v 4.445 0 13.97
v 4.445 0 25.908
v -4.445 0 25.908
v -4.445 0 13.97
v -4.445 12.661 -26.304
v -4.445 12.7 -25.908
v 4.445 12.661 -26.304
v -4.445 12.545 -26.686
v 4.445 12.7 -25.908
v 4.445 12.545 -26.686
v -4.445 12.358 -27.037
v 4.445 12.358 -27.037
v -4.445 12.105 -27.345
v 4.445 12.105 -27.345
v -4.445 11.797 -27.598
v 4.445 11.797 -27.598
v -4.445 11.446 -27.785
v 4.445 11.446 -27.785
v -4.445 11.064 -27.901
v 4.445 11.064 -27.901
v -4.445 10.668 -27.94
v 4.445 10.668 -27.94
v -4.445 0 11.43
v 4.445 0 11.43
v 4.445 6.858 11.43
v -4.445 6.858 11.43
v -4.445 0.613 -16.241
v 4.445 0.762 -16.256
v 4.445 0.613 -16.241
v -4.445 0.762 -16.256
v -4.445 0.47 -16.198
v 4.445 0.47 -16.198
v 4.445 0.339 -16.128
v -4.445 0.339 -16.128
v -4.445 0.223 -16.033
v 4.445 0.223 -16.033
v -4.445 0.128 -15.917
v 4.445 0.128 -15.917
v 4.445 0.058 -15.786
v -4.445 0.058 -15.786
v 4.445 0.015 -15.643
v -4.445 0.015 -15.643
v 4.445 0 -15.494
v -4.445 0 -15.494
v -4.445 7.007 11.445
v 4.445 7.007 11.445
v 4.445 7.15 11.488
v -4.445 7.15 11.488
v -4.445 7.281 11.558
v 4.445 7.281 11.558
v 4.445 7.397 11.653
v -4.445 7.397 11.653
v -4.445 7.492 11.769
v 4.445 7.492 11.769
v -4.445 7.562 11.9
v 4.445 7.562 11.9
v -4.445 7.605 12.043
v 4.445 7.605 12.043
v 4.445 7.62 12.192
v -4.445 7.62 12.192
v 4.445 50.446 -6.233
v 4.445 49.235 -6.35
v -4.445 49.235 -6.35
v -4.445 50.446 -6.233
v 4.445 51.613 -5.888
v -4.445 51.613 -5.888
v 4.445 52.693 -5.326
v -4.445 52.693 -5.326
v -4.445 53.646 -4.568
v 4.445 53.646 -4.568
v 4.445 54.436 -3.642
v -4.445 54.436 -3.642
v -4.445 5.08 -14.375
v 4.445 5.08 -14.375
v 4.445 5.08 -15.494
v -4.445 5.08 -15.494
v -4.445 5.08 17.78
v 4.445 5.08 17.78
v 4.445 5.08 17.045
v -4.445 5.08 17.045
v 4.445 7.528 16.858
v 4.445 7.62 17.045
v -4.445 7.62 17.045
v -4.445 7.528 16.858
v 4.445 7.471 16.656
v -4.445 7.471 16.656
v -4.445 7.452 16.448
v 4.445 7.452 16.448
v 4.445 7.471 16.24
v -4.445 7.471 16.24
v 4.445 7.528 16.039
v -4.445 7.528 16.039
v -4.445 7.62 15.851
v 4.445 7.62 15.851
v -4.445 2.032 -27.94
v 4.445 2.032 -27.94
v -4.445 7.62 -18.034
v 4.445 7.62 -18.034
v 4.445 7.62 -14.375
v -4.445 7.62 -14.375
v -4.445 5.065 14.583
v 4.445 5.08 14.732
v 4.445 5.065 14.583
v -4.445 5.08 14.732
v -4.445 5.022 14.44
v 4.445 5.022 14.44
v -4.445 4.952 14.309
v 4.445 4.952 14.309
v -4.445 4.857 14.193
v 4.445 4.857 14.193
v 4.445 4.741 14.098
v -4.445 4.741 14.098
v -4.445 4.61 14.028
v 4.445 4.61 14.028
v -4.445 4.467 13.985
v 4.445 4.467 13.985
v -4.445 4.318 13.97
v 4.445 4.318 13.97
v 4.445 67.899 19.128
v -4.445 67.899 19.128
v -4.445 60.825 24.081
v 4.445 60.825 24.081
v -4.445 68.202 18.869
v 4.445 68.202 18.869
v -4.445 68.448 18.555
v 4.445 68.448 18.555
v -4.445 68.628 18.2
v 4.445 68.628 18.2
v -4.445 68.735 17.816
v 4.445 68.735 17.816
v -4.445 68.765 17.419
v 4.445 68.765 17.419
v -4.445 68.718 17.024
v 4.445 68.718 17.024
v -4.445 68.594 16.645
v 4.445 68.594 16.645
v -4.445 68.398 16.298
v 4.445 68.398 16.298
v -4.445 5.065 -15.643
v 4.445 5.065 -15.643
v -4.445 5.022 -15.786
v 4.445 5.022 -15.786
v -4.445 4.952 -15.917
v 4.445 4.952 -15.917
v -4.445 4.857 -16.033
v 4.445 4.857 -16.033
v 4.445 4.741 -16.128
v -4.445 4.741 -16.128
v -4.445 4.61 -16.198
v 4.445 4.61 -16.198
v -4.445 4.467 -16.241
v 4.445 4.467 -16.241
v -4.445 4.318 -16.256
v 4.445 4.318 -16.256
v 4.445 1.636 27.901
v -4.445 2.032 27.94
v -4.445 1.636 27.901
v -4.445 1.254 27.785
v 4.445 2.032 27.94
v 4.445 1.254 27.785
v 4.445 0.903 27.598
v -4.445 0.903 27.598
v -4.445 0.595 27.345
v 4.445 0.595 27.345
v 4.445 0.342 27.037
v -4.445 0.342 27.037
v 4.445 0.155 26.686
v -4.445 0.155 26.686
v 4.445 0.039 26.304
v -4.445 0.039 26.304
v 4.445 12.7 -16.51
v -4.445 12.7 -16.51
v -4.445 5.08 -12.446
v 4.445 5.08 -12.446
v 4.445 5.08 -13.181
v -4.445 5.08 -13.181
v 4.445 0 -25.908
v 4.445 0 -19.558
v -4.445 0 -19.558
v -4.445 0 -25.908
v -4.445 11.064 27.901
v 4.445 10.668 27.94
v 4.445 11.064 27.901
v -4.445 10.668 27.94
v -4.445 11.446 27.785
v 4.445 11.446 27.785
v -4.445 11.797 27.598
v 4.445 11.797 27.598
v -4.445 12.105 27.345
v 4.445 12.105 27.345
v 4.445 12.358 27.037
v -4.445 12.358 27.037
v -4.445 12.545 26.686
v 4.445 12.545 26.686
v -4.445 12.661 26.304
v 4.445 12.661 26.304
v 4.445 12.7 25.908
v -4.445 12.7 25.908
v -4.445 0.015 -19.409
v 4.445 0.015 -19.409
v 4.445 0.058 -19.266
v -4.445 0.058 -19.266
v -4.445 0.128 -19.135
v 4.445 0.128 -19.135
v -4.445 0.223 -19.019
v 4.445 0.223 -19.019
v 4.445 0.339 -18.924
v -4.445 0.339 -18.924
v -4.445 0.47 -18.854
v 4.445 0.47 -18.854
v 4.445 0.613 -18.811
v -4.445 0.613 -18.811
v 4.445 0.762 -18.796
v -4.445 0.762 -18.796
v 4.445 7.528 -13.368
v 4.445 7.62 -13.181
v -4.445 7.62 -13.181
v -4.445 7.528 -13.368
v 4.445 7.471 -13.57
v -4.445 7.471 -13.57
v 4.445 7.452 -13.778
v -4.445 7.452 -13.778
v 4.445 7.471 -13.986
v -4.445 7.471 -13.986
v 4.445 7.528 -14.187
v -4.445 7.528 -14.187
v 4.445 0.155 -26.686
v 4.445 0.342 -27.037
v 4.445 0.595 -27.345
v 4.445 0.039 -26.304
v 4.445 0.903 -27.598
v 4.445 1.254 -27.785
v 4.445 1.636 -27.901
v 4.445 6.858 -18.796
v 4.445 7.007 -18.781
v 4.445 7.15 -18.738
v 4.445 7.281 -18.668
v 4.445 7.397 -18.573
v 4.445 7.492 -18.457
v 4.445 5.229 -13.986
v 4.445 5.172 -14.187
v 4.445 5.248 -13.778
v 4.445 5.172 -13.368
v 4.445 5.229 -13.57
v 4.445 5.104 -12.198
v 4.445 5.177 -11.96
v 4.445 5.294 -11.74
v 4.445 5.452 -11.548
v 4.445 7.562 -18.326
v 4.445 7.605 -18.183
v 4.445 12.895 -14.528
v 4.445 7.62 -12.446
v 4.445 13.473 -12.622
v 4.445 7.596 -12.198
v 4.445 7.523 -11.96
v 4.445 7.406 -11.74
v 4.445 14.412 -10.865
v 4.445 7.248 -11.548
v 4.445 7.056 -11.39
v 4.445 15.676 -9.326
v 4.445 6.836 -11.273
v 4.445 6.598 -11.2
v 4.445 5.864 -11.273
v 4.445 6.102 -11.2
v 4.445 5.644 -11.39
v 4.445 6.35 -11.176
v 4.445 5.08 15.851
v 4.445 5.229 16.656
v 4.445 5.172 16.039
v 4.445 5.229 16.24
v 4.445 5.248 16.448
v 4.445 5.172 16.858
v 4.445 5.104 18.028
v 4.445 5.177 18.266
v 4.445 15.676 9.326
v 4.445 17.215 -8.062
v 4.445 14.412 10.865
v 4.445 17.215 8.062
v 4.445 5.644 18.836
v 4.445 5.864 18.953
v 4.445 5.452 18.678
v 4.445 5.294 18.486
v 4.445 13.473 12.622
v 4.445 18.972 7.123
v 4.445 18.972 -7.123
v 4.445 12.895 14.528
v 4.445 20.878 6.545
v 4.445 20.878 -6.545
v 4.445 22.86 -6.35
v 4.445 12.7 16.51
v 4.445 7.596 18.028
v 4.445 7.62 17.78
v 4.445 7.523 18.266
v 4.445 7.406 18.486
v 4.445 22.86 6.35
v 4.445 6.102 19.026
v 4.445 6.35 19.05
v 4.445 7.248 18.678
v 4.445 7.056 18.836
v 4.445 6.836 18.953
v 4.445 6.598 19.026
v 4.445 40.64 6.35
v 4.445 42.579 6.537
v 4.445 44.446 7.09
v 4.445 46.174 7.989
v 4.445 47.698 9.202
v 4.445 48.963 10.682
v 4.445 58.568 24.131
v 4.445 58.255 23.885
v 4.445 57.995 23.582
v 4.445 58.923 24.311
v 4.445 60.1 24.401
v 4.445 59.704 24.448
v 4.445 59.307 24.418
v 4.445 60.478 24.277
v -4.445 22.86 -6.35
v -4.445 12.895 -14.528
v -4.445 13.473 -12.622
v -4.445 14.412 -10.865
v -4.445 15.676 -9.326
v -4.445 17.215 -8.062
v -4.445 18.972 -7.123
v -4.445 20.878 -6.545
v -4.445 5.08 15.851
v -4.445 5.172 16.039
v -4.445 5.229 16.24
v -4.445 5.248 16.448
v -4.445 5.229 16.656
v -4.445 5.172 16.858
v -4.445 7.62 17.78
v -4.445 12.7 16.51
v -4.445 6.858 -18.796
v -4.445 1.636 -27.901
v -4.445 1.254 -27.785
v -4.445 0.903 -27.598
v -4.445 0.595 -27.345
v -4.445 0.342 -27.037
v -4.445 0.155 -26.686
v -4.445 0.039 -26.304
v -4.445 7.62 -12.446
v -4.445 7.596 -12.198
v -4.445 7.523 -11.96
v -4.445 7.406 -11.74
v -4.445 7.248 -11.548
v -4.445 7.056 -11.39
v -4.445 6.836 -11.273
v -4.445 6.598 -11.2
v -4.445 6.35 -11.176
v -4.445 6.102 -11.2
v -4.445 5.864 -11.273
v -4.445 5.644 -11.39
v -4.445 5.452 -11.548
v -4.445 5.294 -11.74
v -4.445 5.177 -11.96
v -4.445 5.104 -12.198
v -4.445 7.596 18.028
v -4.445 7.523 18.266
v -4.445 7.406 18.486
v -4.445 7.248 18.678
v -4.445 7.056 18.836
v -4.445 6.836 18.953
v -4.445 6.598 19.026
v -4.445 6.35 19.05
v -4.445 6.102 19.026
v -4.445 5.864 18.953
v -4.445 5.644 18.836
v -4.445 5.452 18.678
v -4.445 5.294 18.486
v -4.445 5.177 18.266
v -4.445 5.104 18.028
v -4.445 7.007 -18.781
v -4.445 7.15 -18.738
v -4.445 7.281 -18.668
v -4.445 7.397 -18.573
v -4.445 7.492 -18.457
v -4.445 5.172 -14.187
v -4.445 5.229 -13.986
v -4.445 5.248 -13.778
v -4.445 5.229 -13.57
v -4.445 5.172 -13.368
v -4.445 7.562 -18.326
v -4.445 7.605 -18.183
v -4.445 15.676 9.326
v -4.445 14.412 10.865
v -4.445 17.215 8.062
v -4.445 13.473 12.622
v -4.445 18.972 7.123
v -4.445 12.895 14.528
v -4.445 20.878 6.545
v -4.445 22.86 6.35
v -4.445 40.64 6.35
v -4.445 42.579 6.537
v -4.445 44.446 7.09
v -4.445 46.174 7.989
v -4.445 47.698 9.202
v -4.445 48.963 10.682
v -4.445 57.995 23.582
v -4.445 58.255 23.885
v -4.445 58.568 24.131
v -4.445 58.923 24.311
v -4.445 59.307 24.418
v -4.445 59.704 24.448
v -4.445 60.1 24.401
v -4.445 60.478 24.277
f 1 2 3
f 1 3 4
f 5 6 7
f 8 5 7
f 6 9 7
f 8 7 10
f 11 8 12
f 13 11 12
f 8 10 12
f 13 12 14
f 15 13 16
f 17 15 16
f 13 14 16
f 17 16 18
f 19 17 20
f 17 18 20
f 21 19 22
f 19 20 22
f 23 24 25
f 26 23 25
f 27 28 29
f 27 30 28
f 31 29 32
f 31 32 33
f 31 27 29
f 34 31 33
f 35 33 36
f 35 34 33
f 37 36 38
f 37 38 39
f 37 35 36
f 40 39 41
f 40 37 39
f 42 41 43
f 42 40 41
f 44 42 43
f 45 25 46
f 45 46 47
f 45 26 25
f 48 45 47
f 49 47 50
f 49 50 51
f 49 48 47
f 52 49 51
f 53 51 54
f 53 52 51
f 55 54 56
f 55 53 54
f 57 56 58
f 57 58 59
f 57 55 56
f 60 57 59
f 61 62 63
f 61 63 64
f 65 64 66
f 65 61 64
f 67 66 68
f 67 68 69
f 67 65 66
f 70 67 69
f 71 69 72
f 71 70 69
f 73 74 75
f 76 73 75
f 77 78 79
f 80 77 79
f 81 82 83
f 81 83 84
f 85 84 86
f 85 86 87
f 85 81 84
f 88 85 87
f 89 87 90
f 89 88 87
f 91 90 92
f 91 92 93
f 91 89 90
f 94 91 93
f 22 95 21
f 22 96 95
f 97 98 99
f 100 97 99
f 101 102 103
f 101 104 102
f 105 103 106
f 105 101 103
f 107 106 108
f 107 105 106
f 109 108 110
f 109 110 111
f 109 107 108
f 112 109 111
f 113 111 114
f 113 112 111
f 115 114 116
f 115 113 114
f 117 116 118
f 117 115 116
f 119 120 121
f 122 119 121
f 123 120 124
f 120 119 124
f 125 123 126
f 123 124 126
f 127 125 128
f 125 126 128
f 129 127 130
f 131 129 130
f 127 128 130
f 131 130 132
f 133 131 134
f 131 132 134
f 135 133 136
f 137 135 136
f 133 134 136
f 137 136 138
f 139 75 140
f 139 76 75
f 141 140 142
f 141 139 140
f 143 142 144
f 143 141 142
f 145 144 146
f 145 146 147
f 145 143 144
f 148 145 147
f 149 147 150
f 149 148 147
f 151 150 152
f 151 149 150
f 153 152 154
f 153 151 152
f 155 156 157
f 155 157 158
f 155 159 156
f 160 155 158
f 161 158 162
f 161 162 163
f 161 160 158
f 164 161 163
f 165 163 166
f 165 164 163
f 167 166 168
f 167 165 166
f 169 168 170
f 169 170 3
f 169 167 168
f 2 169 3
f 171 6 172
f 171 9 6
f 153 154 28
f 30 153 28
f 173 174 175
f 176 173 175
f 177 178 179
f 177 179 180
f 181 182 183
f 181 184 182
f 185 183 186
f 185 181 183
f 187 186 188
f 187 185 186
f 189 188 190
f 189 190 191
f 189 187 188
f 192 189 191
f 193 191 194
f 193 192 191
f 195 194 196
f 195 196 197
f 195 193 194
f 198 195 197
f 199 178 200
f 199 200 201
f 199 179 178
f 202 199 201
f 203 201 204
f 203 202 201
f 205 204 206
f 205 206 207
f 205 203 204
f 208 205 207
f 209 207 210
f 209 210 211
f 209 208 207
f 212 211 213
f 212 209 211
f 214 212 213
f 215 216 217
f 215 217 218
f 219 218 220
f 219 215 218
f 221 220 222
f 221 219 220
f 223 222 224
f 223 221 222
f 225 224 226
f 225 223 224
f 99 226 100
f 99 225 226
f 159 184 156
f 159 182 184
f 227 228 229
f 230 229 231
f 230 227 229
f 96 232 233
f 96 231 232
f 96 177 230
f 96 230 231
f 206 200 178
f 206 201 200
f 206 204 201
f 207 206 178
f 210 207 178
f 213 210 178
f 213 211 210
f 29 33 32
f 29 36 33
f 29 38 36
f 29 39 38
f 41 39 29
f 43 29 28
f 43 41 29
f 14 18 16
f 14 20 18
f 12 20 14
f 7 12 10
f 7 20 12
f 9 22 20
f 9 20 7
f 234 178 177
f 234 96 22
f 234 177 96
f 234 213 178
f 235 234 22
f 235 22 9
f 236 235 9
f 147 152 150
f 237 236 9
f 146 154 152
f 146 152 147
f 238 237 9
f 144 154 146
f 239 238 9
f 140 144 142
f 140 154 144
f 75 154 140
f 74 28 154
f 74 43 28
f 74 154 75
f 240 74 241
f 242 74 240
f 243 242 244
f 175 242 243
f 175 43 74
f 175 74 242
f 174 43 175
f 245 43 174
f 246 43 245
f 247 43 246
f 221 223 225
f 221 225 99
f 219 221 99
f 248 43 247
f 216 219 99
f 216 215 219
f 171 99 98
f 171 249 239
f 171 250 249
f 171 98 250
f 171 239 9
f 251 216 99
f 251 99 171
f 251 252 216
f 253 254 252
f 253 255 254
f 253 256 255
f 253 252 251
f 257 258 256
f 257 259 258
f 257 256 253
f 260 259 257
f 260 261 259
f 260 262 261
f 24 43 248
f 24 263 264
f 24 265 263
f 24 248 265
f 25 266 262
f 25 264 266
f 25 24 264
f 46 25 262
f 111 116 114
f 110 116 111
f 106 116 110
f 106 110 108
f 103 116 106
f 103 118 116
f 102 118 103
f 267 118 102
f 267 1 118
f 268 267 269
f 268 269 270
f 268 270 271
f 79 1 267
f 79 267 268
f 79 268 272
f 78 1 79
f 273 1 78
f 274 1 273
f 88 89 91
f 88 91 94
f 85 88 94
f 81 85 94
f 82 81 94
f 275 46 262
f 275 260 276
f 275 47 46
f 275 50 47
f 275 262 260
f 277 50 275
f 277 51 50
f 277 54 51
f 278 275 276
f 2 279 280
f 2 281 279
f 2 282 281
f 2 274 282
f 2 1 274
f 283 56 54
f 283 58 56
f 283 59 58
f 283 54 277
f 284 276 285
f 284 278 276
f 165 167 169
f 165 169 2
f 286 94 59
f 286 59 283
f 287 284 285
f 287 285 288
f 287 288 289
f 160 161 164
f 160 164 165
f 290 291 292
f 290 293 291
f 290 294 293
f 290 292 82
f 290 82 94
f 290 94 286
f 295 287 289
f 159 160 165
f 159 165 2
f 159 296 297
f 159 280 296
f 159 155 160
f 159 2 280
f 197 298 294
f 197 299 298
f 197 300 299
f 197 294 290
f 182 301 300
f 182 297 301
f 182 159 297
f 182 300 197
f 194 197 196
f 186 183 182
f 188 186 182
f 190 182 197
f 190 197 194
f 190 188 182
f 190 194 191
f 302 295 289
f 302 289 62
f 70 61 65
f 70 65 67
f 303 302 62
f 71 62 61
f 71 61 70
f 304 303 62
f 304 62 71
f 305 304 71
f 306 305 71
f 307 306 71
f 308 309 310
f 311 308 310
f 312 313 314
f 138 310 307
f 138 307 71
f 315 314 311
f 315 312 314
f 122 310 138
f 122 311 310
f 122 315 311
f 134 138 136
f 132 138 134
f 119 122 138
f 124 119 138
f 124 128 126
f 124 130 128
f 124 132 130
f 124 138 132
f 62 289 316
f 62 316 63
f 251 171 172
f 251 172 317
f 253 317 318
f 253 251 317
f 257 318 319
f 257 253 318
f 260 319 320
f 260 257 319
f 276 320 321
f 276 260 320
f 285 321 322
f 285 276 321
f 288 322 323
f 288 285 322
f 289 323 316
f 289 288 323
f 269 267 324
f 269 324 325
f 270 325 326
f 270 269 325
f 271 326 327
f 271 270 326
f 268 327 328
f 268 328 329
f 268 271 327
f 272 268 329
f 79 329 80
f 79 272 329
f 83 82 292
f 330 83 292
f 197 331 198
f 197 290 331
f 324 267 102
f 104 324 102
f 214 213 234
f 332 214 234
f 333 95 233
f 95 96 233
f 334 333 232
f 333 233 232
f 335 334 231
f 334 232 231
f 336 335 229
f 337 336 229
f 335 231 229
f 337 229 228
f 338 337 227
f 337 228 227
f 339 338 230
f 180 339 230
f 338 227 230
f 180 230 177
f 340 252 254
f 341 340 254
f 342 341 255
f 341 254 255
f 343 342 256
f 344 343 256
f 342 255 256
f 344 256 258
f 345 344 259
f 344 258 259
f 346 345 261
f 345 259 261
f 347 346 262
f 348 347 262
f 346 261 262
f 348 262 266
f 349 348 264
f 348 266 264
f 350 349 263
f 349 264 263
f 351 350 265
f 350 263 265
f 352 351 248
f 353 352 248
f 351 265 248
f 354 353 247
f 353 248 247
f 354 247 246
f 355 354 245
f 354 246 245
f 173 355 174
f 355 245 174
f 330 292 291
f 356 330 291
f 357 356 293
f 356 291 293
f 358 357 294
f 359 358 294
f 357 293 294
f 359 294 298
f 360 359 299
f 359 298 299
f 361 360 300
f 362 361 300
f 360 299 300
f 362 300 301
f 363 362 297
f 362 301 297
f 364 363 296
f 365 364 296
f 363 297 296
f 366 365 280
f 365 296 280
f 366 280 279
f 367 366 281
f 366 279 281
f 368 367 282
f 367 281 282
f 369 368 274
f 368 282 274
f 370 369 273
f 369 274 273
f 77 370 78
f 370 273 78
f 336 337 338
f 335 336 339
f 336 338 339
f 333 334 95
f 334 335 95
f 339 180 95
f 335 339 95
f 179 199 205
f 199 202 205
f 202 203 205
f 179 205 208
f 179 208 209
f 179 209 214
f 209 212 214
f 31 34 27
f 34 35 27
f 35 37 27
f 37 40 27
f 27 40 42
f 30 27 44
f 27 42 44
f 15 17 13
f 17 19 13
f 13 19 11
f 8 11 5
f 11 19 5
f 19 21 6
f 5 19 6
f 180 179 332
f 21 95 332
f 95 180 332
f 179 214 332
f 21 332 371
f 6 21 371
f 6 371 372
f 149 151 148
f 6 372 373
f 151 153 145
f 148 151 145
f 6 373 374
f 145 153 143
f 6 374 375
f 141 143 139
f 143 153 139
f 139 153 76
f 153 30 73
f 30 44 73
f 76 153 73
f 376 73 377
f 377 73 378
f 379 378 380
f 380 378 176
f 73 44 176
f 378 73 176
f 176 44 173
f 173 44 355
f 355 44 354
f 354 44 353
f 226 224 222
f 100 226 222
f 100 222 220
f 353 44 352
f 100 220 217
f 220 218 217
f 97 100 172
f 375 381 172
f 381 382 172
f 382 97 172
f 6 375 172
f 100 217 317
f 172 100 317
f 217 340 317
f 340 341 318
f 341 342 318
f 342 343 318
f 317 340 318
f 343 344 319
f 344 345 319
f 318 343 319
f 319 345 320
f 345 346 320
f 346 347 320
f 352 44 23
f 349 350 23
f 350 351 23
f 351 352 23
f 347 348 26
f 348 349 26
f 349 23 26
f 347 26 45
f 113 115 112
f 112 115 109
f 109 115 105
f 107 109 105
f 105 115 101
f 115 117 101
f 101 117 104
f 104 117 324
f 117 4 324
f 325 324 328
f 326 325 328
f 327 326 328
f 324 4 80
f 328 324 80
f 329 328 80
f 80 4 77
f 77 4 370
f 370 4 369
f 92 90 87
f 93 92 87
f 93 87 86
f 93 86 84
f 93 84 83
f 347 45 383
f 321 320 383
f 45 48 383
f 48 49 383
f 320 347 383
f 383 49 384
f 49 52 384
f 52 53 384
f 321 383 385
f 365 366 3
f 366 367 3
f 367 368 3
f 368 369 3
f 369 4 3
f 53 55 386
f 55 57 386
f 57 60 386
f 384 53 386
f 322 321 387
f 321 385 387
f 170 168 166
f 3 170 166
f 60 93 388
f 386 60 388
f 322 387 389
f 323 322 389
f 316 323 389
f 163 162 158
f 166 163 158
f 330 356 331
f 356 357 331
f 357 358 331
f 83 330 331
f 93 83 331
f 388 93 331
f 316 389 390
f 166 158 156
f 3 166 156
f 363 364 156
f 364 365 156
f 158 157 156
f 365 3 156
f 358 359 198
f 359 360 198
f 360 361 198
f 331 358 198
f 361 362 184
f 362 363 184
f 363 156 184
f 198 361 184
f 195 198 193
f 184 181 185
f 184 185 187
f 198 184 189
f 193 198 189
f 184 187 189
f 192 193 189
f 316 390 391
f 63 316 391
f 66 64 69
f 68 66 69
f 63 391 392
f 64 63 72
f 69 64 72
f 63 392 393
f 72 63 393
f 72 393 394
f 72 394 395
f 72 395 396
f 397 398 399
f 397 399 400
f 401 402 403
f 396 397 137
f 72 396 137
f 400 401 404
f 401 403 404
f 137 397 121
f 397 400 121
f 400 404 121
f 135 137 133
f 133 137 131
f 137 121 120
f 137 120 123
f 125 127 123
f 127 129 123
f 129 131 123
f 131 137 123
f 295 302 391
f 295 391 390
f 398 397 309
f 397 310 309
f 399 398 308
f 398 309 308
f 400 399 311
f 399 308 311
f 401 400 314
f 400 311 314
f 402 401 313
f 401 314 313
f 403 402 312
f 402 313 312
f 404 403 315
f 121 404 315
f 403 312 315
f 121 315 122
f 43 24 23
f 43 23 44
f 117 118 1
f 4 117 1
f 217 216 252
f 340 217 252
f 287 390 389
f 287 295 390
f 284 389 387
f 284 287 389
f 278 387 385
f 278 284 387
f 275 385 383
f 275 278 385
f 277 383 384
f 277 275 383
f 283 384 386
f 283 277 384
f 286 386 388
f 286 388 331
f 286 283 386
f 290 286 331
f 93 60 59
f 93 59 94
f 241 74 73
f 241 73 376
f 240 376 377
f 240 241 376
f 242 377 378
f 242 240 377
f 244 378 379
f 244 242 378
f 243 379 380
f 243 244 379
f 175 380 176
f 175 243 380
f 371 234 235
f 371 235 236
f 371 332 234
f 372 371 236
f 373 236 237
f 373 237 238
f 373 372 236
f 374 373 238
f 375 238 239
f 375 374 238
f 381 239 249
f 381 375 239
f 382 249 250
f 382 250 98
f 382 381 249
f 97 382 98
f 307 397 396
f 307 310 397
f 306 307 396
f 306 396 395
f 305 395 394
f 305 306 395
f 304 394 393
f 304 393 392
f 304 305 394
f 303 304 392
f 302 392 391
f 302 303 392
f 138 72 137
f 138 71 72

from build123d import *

# Parameters (mm, degrees)
F1_DEPTH = 4.445
F2_R     = 2.032
F4_DEPTH = 8.891
F5_R     = 0.762
F7_DEPTH = 8.89


# Not quite as in the source:
# - a feature names something its author has since deleted; it is built from what else it names


with BuildPart() as f1:
    # F0 (on Right) → F1 (new body, symmetric)
    with BuildSketch(Plane.YZ):
        with BuildLine():
            Line((12.7, 27.94), (0, 27.94))
            Line((0, 27.94), (0, -27.94))
            Line((0, -27.94), (12.7, -27.94))
            Line((12.7, -27.94), (12.7, -16.51))
            ThreePointArc((12.7, -16.51), (15.6757951031, -9.3257951031), (22.86, -6.35))
            Line((22.86, -6.35), (49.2345620046, -6.35))
            ThreePointArc((49.2345620046, -6.35), (52.1666656987, -5.6325187907), (54.4361774858, -3.6422103708))
            Line((54.4361774858, -3.6422103708), (69.5640047708, 17.9625660125))
            Line((69.5640047708, 17.9625660125), (59.1607738083, 25.2469867541))
            Line((59.1607738083, 25.2469867541), (48.96258477, 10.6824634067))
            ThreePointArc((48.96258477, 10.6824634067), (45.3313659105, 7.4979699349), (40.64, 6.35))
            Line((40.64, 6.35), (22.86, 6.35))
            ThreePointArc((22.86, 6.35), (15.6757951031, 9.3257951031), (12.7, 16.51))
            Line((12.7, 16.51), (12.7, 27.94))
        make_face()
    extrude(amount=F1_DEPTH, both=True)

    # F2
    f2_edges = [f1.edges().sort_by_distance(p)[0] for p in [
        (0, 12.7, 27.94),
        (0, 59.160774, 25.246987),
        (0, 69.564005, 17.962566),
        (0, 12.7, -27.94),
        (0, 0, -27.94),
        (0, 0, 27.94),
    ]]
    fillet(f2_edges, radius=F2_R)

    # F3 (on face) → F4 (cut, through all)
    with BuildSketch(Plane.YZ.offset(4.445)):
        with BuildLine():
            Line((7.62, 11.43), (7.62, 17.78))
            ThreePointArc((7.62, 17.78), (6.35, 19.05), (5.08, 17.78))
            Line((5.08, 17.78), (5.08, 13.97))
            Line((5.08, 13.97), (0, 13.97))
            Line((0, 13.97), (0, 11.43))
            Line((0, 11.43), (7.62, 11.43))
        make_face()
        with BuildLine():
            Line((7.62, -18.796), (7.62, -12.446))
            ThreePointArc((7.62, -12.446), (6.35, -11.176), (5.08, -12.446))
            Line((5.08, -12.446), (5.08, -16.256))
            Line((5.08, -16.256), (0, -16.256))
            Line((0, -16.256), (0, -18.796))
            Line((0, -18.796), (7.62, -18.796))
        make_face()
    extrude(amount=-F4_DEPTH, mode=Mode.SUBTRACT)

    # F5
    f5_edges = [f1.edges().sort_by_distance(p)[0] for p in [
        (0, 7.62, 11.43),
        (0, 0, -16.256),
        (0, 7.62, -18.796),
        (0, 0, -18.796),
        (0, 5.08, -16.256),
        (0, 5.08, 13.97),
    ]]
    fillet(f5_edges, radius=F5_R)

    # F6 (on face) → F7 (join, through all)
    with BuildSketch(Plane.YZ.offset(4.445)):
        with BuildLine():
            Line((5.08, 17.0451861632), (5.08, 15.8510145557))
            ThreePointArc((5.08, 15.8510145557), (5.2483526058, 16.4481003594), (5.08, 17.0451861632))
        make_face()
        with BuildLine():
            Line((5.08, -13.1808138368), (5.08, -14.3749854443))
            ThreePointArc((5.08, -14.3749854443), (5.2483526058, -13.7778996406), (5.08, -13.1808138368))
        make_face()
        with BuildLine():
            Line((7.62, -14.3749854443), (7.62, -13.1808138368))
            ThreePointArc((7.62, -13.1808138368), (7.4516473942, -13.7778996406), (7.62, -14.3749854443))
        make_face()
        with BuildLine():
            Line((7.62, 15.8510145557), (7.62, 17.0451861632))
            ThreePointArc((7.62, 17.0451861632), (7.4516473942, 16.4481003594), (7.62, 15.8510145557))
        make_face()
    extrude(amount=-F7_DEPTH)


solid = f1.part
